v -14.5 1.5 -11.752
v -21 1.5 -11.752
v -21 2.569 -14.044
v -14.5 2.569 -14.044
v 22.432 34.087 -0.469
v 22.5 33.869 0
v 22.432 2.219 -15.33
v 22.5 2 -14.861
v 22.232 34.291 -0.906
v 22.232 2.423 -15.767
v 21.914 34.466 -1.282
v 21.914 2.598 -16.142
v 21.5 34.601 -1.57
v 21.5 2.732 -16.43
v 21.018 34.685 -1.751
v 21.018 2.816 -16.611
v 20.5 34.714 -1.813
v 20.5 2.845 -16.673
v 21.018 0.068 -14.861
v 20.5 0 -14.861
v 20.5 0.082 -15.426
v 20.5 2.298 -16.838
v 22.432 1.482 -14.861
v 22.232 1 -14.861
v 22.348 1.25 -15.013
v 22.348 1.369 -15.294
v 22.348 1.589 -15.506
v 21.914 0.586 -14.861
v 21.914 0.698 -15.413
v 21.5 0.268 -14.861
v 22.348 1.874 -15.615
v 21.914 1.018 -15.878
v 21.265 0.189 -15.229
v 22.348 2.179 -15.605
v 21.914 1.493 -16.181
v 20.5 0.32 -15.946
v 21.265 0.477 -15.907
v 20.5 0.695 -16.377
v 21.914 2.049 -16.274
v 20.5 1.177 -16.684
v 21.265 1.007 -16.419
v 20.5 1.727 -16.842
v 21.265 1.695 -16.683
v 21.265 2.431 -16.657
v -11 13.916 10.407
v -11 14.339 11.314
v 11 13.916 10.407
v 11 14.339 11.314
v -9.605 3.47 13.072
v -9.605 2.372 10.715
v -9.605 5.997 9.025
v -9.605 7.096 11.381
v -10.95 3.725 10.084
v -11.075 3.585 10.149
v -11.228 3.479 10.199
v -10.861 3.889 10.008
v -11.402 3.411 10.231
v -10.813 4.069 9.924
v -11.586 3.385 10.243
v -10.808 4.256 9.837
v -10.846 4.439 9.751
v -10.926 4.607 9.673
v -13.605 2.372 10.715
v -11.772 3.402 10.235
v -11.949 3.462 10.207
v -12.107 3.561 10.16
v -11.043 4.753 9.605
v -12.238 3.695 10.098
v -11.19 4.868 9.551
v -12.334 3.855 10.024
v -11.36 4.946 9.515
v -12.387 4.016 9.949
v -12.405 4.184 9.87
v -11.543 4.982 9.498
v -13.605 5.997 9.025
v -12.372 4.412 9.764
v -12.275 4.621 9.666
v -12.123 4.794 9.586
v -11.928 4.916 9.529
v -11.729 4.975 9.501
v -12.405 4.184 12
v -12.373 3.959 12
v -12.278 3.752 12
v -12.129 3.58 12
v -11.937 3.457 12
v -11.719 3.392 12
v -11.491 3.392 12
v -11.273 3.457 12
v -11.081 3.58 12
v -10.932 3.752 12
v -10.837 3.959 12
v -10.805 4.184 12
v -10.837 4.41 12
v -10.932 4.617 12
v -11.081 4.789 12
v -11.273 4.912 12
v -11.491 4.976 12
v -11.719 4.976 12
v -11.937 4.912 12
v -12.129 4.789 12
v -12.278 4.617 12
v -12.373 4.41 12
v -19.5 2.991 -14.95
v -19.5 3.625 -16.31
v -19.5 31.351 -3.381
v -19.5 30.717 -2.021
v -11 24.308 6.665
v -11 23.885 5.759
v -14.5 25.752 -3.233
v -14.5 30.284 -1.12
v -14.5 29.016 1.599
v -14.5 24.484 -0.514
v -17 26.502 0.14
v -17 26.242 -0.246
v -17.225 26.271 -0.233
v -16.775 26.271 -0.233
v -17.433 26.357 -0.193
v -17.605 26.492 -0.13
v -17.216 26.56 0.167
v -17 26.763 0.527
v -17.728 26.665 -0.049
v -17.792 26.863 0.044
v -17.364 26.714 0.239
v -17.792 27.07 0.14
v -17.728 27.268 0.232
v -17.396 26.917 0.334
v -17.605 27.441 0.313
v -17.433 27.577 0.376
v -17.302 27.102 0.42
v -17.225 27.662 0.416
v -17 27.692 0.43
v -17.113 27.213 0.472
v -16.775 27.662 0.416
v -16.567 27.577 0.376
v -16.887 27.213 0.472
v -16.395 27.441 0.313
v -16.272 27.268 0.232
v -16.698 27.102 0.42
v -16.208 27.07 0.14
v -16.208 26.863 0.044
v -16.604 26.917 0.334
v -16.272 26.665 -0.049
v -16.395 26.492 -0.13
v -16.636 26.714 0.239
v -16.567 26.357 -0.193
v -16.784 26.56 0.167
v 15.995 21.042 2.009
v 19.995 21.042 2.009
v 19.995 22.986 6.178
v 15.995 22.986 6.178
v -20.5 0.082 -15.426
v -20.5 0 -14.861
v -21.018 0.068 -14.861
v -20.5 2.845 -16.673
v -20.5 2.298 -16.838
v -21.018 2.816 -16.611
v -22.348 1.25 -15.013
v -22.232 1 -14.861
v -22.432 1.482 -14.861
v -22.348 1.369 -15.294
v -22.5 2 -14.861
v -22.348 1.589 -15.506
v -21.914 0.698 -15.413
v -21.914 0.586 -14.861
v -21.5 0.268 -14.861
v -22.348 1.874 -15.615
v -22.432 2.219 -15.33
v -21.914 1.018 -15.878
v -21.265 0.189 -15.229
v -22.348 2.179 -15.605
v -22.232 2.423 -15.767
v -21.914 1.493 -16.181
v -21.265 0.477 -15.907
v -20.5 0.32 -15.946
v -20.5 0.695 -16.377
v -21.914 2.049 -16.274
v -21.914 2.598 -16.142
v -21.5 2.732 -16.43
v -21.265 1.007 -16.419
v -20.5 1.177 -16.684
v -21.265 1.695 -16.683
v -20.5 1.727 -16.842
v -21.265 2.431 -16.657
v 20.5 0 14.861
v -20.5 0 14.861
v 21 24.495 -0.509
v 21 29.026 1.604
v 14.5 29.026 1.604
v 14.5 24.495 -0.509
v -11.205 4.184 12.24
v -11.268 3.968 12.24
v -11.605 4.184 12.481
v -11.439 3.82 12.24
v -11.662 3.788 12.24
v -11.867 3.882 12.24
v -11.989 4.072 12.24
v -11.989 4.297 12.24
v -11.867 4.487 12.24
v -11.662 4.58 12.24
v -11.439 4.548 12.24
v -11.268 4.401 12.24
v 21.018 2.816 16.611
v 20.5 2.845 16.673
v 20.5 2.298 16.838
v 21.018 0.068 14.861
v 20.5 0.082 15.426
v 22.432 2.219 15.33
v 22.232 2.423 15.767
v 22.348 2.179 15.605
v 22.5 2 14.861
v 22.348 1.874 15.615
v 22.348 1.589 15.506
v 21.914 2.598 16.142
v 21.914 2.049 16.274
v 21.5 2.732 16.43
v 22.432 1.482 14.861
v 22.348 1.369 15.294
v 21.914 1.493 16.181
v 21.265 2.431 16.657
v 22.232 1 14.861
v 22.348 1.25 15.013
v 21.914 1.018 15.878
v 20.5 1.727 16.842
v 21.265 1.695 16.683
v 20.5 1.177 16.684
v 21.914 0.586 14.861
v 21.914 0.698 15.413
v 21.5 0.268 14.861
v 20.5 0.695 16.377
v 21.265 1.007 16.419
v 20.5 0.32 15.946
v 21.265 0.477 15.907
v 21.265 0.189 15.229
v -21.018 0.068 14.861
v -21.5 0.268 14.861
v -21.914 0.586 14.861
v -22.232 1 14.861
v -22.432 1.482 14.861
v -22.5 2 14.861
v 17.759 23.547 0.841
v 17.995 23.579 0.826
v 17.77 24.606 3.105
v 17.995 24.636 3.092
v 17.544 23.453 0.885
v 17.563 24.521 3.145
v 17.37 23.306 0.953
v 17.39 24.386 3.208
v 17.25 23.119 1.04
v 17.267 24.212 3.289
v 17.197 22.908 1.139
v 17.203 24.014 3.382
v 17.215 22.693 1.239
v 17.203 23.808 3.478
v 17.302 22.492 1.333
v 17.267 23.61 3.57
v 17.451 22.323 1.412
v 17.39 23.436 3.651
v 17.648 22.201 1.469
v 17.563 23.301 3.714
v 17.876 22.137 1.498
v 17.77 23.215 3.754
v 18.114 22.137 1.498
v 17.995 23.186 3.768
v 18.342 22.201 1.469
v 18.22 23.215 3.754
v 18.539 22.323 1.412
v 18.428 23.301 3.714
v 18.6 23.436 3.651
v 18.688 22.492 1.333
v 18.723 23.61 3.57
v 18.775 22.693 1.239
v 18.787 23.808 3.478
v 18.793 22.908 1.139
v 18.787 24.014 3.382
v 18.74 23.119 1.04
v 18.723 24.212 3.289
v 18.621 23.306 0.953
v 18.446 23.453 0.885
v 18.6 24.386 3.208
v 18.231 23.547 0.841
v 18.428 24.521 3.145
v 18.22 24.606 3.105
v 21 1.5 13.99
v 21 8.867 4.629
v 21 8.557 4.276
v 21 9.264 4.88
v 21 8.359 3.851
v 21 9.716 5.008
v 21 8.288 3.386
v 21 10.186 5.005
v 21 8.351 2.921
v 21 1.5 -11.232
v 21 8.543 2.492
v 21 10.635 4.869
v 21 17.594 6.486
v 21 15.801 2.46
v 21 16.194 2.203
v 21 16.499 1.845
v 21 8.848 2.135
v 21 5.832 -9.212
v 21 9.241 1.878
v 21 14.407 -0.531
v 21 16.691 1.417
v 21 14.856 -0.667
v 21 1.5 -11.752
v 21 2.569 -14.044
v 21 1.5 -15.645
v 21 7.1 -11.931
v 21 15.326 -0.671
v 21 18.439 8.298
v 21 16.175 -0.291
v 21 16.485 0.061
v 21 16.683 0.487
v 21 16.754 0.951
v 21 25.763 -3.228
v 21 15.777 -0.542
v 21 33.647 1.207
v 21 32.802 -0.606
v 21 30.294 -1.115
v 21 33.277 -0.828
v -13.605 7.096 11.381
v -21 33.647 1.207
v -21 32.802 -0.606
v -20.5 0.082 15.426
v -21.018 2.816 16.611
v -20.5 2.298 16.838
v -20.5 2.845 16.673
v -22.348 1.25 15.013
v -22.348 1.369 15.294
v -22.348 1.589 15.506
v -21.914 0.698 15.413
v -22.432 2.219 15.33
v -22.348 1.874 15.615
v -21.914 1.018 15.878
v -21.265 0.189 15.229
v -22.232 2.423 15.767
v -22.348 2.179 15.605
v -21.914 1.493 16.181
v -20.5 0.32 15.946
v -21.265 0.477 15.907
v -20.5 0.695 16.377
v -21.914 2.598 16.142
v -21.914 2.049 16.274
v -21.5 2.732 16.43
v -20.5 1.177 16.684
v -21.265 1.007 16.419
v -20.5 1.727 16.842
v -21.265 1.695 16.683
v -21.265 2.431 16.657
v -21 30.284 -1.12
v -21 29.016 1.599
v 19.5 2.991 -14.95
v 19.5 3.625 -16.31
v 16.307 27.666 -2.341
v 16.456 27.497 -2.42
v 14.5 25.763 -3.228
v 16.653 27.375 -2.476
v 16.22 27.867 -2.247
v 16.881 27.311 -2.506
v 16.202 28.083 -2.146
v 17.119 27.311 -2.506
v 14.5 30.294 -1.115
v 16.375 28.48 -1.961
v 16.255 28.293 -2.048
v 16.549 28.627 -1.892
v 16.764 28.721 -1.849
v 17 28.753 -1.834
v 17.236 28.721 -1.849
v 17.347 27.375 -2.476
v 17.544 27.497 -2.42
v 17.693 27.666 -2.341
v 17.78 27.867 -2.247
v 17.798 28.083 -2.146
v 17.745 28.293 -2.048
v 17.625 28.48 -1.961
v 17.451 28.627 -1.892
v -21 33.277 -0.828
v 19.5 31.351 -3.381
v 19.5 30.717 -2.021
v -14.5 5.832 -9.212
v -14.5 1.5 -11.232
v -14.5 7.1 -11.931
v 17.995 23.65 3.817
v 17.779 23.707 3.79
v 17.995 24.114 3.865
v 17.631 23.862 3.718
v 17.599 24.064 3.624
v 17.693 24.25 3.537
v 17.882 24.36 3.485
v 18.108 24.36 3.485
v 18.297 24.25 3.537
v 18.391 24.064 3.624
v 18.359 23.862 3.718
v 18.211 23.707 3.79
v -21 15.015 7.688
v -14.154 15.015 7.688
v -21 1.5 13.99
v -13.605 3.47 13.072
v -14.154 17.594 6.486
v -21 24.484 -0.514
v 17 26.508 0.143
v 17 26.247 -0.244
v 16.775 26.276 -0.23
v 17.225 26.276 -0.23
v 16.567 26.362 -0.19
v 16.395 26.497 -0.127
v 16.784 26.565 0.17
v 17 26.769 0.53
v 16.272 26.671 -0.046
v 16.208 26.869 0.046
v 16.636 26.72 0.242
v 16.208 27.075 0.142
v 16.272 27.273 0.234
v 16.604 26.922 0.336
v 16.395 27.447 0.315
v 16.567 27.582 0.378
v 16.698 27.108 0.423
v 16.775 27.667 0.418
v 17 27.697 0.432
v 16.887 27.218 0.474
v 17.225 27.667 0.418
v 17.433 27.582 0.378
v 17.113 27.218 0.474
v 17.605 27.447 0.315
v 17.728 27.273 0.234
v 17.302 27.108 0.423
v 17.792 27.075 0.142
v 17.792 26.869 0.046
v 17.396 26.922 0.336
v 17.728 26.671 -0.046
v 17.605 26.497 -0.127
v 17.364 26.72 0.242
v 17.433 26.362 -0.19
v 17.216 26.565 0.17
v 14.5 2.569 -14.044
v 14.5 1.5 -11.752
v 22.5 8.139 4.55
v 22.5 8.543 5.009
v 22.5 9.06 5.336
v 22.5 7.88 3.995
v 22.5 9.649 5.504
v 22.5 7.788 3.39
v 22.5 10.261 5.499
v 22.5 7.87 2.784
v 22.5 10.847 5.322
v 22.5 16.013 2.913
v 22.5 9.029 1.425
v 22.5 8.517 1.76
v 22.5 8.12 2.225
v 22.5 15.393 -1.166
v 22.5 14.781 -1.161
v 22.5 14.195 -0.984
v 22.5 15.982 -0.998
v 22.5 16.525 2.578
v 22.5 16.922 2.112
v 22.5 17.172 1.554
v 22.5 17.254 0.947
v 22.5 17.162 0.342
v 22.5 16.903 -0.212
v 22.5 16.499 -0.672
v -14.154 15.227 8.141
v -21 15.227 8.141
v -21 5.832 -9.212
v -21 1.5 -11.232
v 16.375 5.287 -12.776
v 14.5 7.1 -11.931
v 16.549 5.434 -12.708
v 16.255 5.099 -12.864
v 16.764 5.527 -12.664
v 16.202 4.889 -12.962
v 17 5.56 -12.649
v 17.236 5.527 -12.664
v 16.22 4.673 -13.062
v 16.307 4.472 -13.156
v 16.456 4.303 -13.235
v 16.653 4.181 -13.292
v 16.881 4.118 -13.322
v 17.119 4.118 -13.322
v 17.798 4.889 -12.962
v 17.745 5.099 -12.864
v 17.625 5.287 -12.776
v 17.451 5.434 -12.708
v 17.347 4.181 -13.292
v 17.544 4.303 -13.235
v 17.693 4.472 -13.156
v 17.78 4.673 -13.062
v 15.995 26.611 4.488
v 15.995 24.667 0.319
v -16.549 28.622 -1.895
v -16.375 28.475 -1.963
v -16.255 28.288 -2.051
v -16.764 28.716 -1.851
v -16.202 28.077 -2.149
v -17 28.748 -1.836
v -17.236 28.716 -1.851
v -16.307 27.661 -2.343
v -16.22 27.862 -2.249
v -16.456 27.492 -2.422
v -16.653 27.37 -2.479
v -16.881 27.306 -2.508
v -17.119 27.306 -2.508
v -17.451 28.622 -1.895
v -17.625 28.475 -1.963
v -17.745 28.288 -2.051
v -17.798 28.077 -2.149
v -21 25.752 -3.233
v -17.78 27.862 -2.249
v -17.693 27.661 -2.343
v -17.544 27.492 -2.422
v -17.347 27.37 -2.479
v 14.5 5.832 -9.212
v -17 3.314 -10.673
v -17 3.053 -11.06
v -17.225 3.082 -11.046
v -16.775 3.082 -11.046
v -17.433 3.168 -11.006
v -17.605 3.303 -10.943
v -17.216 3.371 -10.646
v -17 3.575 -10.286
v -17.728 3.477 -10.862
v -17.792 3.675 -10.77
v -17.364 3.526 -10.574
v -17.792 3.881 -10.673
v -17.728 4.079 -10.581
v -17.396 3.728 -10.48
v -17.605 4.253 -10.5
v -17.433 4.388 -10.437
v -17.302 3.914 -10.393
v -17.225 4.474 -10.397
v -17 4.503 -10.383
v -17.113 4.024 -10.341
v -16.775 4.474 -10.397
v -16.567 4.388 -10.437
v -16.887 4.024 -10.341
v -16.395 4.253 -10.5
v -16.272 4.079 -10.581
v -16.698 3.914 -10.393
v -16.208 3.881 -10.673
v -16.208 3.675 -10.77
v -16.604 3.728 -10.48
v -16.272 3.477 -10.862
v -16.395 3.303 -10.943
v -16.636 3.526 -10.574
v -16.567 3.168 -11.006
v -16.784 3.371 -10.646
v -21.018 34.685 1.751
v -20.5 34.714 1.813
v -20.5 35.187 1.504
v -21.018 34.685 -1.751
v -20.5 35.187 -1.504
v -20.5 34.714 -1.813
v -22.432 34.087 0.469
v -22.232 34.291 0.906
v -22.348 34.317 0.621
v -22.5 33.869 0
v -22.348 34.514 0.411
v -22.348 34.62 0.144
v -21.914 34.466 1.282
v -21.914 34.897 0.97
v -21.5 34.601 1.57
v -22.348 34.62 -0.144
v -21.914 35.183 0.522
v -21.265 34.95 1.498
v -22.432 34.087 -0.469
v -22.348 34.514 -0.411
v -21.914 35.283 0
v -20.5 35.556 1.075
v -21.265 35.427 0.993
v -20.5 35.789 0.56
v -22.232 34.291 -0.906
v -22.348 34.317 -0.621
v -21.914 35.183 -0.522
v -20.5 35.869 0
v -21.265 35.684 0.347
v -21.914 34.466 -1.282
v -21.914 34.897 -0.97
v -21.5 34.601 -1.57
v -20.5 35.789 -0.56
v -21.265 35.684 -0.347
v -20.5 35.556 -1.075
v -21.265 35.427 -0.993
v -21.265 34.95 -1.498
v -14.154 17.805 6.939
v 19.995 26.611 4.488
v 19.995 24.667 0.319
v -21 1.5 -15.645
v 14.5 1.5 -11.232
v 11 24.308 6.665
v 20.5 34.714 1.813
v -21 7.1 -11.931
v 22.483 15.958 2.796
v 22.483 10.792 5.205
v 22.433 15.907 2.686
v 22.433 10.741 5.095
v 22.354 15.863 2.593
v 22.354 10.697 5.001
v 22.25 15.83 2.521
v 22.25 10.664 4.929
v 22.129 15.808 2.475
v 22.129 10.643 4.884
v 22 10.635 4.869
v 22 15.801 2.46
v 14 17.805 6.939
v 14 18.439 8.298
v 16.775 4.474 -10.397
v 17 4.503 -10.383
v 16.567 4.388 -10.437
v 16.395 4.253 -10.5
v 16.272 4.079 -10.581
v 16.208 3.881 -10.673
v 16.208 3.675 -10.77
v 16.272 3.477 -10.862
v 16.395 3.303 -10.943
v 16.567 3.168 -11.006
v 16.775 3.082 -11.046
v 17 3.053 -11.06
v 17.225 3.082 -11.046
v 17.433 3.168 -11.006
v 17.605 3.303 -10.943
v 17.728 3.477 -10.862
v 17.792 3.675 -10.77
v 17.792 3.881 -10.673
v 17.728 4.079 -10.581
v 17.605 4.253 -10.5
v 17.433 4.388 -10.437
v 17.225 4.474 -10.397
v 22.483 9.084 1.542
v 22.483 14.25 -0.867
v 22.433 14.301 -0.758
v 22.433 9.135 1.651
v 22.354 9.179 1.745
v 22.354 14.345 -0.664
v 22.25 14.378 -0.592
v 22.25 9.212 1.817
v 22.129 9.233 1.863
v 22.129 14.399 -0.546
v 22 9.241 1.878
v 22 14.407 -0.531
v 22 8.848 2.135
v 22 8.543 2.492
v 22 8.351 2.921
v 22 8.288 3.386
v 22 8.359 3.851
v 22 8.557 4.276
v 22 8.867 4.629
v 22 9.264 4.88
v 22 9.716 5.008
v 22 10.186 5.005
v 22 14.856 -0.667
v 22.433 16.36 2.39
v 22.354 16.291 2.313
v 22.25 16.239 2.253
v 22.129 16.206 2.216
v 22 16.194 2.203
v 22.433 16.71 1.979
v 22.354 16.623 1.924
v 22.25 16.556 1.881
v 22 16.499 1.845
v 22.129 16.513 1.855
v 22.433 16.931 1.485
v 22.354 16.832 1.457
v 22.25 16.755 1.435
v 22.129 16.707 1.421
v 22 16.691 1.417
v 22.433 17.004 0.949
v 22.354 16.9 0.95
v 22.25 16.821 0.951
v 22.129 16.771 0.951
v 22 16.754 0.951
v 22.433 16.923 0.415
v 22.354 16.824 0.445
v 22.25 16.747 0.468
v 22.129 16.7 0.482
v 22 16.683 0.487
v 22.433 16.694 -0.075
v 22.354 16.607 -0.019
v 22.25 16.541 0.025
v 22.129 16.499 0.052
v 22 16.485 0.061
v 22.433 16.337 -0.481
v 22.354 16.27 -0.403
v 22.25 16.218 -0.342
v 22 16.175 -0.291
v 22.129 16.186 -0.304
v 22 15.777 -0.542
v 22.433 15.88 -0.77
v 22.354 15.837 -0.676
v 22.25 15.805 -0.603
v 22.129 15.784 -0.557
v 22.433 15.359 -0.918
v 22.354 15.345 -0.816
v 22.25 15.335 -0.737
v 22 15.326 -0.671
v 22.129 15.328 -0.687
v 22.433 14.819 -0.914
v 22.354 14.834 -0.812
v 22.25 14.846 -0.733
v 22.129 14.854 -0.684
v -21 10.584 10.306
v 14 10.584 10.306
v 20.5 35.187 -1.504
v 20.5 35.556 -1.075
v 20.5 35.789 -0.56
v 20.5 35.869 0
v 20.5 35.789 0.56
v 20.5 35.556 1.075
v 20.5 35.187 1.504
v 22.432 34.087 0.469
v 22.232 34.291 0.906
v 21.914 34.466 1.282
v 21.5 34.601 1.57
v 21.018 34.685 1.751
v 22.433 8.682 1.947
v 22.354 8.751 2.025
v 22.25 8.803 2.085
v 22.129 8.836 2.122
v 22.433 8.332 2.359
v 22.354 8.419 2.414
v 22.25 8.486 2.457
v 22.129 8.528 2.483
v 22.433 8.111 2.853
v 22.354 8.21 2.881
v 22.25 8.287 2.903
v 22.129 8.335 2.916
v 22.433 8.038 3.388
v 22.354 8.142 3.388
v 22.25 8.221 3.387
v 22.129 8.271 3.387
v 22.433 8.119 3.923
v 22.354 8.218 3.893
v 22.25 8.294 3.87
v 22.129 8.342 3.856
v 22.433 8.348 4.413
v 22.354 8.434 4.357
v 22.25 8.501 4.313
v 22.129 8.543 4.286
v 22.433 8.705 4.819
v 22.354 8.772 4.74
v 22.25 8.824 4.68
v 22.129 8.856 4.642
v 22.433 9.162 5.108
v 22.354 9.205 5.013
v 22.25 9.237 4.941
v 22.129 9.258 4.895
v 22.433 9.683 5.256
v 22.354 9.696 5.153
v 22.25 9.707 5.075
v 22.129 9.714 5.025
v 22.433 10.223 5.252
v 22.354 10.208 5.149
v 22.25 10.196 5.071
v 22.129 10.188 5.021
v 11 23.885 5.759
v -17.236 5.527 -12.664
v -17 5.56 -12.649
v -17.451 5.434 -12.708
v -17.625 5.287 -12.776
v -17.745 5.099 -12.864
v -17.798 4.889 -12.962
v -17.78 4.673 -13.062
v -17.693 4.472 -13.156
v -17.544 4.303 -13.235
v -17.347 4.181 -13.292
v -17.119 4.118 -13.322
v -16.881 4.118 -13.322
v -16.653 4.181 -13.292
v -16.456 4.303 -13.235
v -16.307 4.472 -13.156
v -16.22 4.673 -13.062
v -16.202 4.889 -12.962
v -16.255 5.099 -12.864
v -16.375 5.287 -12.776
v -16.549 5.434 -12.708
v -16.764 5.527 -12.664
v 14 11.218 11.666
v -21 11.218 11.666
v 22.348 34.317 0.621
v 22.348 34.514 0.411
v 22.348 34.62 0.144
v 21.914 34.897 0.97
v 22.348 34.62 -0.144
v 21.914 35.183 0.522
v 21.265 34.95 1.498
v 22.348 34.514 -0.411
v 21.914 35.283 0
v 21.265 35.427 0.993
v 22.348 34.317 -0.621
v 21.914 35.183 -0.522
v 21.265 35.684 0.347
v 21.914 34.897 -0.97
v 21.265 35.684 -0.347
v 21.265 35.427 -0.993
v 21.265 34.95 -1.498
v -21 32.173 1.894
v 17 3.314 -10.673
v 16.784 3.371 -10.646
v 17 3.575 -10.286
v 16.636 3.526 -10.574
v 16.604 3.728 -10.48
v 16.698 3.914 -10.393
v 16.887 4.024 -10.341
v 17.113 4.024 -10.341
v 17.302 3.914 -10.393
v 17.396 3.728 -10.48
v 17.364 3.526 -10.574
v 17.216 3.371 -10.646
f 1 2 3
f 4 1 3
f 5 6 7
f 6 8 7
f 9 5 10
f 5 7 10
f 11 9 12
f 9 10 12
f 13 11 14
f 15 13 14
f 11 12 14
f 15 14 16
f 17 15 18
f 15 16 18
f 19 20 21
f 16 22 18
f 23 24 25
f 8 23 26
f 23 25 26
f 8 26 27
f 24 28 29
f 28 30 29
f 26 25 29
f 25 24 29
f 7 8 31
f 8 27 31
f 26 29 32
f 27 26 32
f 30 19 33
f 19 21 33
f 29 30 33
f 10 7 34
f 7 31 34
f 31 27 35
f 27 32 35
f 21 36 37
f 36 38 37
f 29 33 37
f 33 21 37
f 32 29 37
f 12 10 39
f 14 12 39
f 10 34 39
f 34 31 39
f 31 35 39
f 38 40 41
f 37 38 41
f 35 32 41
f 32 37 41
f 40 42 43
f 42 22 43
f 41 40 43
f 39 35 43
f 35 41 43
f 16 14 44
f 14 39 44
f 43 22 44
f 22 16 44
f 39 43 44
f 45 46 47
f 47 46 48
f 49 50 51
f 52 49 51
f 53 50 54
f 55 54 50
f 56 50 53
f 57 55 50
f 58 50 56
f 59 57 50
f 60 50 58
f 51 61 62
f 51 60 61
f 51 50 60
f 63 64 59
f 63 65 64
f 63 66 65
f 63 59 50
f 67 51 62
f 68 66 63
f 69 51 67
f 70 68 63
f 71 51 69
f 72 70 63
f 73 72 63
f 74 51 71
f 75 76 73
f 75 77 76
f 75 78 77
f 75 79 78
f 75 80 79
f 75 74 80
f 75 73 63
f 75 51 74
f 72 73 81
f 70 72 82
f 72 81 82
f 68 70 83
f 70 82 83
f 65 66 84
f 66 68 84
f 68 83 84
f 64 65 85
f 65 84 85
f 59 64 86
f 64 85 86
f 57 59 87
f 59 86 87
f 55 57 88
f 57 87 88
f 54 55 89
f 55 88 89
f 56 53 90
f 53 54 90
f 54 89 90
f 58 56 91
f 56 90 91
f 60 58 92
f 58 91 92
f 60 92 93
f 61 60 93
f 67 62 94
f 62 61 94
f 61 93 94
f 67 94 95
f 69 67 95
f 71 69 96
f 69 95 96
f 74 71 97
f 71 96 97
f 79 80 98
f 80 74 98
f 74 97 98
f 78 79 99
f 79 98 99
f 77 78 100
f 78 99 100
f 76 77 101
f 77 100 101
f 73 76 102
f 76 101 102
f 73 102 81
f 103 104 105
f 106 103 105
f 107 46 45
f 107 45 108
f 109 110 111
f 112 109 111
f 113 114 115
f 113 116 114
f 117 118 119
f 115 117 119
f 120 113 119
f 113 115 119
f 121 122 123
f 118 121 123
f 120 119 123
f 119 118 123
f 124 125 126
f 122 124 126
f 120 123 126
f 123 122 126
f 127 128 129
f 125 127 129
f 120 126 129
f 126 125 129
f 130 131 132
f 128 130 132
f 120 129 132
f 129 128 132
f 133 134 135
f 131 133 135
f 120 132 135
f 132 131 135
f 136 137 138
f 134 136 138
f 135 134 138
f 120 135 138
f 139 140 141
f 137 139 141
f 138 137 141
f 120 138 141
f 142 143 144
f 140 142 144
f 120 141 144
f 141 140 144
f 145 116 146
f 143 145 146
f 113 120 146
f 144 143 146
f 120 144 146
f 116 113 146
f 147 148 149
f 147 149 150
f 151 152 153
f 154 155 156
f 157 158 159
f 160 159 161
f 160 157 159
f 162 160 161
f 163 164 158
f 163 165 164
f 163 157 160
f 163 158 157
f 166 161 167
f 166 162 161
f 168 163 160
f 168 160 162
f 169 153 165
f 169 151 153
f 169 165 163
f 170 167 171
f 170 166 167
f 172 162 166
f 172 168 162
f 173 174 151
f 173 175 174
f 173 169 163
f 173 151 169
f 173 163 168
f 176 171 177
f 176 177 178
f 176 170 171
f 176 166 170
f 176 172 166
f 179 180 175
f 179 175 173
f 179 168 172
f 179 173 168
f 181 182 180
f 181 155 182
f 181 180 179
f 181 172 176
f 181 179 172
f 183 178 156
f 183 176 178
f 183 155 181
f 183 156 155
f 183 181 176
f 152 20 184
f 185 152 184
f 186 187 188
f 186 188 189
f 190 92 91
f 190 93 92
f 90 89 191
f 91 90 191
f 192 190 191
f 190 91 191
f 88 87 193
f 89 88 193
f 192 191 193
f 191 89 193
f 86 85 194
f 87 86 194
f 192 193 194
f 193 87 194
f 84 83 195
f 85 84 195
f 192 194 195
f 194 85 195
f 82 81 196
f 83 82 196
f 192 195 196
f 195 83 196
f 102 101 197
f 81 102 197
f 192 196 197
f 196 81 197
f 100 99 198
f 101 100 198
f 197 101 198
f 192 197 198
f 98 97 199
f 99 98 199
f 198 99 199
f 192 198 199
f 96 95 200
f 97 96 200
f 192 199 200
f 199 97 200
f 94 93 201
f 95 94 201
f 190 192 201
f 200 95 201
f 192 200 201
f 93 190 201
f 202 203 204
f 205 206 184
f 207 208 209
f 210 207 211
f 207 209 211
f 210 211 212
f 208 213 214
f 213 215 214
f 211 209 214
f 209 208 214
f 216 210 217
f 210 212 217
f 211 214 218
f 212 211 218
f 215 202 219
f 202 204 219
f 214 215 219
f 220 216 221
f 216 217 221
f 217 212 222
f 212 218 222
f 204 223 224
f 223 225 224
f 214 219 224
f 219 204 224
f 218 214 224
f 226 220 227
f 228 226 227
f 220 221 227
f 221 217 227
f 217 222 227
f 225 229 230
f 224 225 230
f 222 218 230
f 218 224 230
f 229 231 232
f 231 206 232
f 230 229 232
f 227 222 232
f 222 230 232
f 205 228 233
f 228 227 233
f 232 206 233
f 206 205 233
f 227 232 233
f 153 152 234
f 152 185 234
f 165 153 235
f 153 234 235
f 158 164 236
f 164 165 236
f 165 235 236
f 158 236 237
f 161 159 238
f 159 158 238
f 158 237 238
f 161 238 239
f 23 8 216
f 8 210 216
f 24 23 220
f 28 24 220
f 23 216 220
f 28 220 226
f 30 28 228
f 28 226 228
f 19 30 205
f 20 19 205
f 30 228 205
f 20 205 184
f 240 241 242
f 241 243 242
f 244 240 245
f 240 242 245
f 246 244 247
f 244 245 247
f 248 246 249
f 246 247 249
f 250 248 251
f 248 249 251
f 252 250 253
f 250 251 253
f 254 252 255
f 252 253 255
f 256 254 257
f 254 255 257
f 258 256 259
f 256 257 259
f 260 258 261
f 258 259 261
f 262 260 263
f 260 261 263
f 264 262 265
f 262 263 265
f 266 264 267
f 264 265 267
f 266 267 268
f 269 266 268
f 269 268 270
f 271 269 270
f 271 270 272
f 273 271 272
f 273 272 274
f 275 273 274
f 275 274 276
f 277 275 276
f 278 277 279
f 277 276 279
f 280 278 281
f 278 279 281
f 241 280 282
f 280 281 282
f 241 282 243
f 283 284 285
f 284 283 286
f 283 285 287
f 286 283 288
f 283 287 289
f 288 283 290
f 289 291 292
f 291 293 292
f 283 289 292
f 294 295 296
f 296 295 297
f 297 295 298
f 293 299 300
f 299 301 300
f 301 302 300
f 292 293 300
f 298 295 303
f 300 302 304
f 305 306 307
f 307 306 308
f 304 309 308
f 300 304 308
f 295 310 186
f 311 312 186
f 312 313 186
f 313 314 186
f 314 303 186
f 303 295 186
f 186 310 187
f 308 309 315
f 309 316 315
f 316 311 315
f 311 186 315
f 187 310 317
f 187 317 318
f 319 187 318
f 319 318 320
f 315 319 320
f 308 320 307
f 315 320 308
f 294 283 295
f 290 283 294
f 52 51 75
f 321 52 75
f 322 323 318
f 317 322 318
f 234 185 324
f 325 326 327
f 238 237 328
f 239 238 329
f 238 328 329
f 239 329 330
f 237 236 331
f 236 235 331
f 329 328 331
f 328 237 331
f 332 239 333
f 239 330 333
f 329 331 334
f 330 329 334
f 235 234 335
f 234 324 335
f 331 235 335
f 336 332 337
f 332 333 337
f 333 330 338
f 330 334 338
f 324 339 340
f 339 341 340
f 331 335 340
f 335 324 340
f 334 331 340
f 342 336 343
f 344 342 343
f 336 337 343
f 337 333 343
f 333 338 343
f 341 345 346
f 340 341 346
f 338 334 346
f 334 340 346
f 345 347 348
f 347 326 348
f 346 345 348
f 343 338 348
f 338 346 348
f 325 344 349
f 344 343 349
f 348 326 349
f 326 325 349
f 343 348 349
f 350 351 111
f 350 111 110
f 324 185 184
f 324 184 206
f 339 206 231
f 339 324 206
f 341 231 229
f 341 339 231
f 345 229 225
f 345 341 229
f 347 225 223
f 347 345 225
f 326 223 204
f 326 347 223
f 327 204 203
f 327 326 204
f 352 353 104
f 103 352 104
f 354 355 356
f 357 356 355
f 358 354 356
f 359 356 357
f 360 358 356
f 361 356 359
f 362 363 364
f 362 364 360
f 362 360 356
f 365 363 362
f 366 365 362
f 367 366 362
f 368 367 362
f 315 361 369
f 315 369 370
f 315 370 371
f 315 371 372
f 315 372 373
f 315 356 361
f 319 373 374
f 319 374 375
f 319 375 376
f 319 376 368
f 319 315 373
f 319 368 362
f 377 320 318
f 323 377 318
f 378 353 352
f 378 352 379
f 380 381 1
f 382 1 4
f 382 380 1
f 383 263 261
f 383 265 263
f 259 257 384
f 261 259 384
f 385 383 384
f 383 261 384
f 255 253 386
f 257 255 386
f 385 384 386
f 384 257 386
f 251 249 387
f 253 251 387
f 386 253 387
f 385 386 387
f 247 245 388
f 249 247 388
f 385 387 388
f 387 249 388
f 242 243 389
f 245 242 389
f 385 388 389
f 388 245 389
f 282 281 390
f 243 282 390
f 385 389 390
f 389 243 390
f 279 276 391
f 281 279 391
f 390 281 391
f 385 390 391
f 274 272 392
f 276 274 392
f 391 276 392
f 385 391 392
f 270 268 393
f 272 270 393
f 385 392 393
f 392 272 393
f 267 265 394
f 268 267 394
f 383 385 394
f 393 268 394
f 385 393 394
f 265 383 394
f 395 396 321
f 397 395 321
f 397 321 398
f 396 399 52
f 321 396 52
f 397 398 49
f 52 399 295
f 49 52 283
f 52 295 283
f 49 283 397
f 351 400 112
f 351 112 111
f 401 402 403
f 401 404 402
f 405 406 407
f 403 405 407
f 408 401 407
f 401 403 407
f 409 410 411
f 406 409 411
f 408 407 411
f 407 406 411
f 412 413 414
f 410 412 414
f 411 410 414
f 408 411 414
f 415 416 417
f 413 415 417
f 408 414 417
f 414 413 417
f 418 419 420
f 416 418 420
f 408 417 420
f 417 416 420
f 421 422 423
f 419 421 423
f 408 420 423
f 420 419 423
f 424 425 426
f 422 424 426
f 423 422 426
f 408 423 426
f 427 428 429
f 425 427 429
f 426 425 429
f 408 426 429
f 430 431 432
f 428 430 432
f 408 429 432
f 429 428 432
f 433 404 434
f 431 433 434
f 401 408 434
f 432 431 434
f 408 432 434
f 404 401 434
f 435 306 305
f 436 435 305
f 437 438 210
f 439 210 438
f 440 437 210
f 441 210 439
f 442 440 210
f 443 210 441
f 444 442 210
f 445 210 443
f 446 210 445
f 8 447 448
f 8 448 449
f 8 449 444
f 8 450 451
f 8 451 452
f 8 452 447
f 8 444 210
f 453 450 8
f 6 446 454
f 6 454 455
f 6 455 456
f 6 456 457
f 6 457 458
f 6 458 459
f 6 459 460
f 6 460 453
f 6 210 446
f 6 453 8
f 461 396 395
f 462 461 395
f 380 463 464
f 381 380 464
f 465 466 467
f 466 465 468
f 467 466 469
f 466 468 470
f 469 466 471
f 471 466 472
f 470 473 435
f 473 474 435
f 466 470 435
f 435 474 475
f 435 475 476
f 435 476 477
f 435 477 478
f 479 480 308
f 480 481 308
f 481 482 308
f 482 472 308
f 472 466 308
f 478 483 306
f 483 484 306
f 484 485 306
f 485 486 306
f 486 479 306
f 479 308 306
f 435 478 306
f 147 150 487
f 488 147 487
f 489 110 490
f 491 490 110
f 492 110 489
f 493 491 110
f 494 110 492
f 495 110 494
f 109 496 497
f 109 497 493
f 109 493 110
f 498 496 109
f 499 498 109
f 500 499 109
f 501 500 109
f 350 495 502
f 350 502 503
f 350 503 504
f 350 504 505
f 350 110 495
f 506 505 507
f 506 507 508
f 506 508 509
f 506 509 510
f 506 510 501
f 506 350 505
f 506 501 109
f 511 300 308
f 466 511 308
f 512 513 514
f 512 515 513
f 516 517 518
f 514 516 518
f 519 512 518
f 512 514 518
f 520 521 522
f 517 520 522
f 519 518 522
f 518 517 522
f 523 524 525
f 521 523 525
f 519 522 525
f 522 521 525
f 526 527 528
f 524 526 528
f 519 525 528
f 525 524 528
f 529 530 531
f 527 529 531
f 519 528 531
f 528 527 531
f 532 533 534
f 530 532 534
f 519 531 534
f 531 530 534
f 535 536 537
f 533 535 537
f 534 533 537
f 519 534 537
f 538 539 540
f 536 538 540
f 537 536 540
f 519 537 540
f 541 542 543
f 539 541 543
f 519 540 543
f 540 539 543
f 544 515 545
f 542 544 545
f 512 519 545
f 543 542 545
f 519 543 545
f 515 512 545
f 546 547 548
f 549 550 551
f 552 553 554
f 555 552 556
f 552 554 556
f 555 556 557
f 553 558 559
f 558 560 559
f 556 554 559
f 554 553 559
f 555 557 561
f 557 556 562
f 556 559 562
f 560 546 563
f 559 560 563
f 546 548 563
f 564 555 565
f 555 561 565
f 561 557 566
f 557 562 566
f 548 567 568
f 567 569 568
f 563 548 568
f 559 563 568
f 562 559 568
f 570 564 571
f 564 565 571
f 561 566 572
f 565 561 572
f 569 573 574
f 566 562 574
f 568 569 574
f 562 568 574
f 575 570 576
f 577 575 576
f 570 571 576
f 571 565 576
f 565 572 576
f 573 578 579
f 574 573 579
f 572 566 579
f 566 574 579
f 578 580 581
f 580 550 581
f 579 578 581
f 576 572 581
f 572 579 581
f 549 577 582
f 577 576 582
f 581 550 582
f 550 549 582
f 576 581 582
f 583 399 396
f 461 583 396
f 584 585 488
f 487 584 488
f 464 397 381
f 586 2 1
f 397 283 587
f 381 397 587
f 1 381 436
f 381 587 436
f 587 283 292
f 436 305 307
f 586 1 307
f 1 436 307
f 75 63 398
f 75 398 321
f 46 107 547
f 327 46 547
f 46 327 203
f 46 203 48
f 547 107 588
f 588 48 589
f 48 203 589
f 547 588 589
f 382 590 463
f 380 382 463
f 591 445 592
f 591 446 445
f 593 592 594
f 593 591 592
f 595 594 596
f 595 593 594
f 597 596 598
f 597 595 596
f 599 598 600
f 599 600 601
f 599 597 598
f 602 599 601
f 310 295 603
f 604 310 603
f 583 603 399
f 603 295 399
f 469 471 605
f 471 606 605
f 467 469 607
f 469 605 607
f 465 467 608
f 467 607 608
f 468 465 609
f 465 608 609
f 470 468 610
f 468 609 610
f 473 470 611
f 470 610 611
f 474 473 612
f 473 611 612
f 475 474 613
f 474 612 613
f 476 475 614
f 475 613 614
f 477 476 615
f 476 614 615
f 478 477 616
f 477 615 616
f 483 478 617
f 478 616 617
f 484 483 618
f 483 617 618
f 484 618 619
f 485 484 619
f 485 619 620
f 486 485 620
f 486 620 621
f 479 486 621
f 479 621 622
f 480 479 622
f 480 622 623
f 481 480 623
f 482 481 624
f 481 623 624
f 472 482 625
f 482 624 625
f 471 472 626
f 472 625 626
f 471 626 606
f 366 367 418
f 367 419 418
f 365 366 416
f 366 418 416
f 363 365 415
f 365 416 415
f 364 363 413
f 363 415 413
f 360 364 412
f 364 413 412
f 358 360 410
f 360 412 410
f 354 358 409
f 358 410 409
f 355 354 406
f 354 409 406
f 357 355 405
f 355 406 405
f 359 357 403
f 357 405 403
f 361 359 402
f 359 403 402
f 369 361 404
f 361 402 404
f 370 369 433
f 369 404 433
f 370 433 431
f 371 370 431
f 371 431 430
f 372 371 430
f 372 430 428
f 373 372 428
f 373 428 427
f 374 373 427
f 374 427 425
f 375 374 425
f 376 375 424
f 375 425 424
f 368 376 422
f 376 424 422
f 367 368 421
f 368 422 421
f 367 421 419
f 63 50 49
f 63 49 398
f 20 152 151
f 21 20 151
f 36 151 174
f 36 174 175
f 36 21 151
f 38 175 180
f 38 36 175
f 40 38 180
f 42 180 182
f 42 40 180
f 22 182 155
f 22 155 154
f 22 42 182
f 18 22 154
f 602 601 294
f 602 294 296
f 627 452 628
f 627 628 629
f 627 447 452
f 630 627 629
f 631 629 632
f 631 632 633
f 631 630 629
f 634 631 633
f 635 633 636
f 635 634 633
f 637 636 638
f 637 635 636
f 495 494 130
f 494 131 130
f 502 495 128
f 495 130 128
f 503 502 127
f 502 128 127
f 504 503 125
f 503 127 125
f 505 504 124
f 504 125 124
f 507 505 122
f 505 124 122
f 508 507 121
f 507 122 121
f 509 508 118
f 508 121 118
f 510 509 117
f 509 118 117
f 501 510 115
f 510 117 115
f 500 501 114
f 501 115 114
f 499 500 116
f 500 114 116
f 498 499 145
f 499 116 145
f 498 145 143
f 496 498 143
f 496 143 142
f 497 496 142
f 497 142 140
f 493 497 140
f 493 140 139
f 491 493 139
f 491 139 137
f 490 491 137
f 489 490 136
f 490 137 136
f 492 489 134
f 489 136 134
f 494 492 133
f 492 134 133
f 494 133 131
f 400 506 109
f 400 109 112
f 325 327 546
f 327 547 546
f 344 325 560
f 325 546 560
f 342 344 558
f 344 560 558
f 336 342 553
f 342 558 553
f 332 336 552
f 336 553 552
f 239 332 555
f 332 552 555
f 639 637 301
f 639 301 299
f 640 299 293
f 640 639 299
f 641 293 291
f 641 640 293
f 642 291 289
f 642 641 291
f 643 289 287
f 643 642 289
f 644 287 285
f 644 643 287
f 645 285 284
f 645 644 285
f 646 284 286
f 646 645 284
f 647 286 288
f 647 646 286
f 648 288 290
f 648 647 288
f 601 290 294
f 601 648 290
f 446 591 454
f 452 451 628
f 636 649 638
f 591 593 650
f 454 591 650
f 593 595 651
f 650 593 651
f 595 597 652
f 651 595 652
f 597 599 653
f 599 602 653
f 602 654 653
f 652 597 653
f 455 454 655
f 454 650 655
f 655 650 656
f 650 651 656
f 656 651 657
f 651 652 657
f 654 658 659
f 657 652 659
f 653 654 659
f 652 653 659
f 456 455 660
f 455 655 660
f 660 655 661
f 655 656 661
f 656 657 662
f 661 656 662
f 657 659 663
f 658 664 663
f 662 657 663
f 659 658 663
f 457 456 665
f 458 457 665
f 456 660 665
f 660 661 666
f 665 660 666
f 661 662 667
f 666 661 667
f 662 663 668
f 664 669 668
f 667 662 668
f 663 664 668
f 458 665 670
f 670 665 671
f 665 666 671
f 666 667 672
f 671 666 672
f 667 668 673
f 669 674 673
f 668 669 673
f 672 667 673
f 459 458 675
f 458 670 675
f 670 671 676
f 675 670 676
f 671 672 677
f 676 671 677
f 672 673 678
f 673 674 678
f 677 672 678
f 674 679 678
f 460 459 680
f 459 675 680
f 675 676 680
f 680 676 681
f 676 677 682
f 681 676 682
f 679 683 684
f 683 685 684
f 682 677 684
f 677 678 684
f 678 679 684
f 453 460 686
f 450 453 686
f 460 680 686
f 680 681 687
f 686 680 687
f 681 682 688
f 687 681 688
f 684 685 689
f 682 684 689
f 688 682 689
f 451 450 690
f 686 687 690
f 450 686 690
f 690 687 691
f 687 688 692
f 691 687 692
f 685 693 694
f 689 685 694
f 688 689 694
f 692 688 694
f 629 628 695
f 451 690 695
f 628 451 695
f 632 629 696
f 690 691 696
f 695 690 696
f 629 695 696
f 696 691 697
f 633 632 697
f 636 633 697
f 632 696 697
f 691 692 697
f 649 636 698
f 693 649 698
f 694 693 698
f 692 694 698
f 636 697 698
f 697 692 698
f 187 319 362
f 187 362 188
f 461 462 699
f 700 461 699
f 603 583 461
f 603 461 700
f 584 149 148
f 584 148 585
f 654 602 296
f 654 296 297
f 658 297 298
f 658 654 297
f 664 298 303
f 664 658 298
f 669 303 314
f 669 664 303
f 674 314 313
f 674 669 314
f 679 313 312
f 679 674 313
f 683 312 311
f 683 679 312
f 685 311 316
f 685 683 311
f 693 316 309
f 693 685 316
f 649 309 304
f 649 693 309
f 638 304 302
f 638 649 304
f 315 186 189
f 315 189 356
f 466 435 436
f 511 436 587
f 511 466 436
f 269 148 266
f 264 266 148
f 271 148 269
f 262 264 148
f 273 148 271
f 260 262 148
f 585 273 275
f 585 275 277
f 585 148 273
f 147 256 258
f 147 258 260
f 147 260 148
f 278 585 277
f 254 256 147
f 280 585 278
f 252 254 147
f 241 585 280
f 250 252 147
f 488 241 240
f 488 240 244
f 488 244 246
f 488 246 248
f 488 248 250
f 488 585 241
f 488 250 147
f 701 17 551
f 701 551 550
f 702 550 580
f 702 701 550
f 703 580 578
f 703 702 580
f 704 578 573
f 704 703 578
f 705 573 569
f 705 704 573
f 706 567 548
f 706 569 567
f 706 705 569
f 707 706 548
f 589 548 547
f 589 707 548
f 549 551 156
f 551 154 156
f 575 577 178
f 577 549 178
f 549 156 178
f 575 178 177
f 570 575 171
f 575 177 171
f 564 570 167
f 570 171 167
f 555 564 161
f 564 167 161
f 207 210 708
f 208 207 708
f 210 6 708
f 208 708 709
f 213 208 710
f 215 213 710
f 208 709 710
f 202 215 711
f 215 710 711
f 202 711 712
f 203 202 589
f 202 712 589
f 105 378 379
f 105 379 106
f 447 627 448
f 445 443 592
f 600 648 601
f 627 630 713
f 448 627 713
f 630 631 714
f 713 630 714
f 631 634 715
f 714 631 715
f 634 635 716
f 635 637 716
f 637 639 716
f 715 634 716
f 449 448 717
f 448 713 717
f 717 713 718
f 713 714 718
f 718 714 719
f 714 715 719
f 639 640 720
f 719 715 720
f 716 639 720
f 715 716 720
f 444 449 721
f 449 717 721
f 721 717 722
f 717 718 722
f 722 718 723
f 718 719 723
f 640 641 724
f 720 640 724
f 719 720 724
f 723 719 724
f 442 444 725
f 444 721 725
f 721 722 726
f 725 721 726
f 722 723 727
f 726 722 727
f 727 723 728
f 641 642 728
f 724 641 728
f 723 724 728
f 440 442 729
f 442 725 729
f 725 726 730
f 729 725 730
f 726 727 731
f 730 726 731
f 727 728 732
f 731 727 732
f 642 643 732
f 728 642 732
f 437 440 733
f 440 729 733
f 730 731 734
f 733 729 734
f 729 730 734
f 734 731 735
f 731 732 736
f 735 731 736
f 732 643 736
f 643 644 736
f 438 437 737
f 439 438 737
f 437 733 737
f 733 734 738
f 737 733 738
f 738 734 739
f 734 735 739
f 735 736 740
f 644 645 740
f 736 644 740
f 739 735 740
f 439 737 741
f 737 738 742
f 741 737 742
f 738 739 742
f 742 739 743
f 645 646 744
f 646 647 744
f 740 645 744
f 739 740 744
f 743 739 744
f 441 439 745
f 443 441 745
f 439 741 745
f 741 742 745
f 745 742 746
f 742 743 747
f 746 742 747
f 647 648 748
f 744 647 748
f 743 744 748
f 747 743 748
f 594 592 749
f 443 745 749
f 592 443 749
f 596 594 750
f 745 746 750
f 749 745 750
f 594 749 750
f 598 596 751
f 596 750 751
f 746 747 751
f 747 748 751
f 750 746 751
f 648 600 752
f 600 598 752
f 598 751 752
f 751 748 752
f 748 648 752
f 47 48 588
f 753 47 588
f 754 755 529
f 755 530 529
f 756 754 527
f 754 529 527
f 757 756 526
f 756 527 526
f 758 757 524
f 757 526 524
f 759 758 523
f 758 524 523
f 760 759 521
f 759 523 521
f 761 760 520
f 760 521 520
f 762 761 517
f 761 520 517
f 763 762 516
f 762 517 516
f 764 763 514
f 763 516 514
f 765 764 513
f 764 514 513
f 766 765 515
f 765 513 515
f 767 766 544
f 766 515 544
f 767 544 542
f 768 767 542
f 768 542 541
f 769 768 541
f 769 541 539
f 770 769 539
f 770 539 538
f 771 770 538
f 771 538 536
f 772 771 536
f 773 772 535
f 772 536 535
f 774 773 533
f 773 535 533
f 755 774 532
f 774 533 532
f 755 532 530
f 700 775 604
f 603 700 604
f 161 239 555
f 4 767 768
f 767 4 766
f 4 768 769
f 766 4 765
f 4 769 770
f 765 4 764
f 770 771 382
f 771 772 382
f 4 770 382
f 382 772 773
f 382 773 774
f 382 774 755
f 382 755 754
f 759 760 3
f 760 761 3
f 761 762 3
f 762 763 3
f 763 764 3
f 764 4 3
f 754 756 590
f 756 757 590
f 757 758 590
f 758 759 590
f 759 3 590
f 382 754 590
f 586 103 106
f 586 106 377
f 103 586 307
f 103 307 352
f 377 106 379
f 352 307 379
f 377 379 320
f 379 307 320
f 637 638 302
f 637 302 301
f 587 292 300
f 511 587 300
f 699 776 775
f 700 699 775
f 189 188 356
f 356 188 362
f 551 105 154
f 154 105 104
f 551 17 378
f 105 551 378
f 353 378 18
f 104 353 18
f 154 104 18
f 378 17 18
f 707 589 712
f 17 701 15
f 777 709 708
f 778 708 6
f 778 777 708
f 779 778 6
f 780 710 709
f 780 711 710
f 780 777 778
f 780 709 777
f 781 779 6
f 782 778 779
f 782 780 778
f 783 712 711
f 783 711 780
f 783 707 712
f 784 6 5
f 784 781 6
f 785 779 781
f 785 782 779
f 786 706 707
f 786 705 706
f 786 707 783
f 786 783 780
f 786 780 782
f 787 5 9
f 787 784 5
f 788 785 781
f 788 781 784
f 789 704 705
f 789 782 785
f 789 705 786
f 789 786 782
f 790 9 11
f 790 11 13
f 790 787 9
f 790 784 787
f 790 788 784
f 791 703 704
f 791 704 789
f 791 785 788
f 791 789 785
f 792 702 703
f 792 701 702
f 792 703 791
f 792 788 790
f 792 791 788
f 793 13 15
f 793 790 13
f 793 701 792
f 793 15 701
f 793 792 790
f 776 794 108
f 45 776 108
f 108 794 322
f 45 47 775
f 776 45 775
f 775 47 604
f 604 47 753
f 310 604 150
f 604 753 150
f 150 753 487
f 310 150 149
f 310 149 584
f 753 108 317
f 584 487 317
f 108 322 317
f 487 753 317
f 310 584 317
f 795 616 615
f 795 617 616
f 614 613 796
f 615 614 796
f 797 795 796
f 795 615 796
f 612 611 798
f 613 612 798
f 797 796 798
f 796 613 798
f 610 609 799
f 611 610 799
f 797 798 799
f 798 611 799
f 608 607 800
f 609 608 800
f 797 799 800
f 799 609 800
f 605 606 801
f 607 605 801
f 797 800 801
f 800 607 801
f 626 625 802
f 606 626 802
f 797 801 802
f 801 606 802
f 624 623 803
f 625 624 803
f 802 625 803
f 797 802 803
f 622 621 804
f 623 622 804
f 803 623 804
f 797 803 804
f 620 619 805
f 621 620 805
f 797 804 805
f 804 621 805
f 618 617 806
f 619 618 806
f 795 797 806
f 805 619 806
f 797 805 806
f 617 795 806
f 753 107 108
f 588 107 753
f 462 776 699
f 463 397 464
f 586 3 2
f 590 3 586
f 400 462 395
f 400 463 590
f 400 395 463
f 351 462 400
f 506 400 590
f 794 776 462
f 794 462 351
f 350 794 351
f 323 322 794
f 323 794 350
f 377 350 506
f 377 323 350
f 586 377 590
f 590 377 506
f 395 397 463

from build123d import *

# Parameters (mm, degrees)
EXTRUDE_1_DEPTH                  = 22.5
SKETCH_2_W                       = 22
SKETCH_2_H                       = 11
CUT_EXTRUDE_1_DEPTH              = 1
CUT_EXTRUDE_2_DEPTH              = 1.5
CUT_EXTRUDE_3_DEPTH              = 21
SKETCH_5_W                       = 39
SKETCH_5_H                       = 30.591628496
CUT_EXTRUDE_4_DEPTH              = 1.5
CUT_EXTRUDE_5_DEPTH              = 2
SKETCH_9_W                       = 4
SKETCH_9_H                       = 4
EXTRUDE_2_DEPTH                  = 5
CUT_EXTRUDE_6_DEPTH              = 5
EXTRUDE_3_DEPTH                  = 8
EXTRUDE_4_DEPTH                  = 8
HOLE_WIZARD_M2_3_D               = 1.6
HOLE_WIZARD_M2_3_DEPTH           = 2.5
HOLE_WIZARD_M2_3_TIP             = 0.480688495
HOLE_WIZARD_M2_3_ON_FACE_2_D     = 1.6
HOLE_WIZARD_M2_3_ON_FACE_2_DEPTH = 2.5
HOLE_WIZARD_M2_3_ON_FACE_2_TIP   = 0.480688495
HOLE_WIZARD_M2_5_D               = 1.6
HOLE_WIZARD_M2_5_DEPTH           = 2.5
HOLE_WIZARD_M2_5_TIP             = 0.480688495
EXTRUDE_6_DEPTH                  = 8
EXTRUDE_7_DEPTH                  = 8
HOLE_WIZARD_M2_7_D               = 1.6
HOLE_WIZARD_M2_7_DEPTH           = 2.5
HOLE_WIZARD_M2_7_TIP             = 0.480688495
HOLE_WIZARD_M2_7_ON_FACE_2_D     = 1.6
HOLE_WIZARD_M2_7_ON_FACE_2_DEPTH = 2.5
HOLE_WIZARD_M2_7_ON_FACE_2_TIP   = 0.480688495
HOLE_WIZARD_M2_11_D              = 1.6
HOLE_WIZARD_M2_11_DEPTH          = 3
HOLE_WIZARD_M2_11_TIP            = 0.480688495
FILLET_2_R                       = 2
FILLET_3_R                       = 0.5


with BuildPart() as part:
    # 草图1 → 凸台-拉伸1 (new body, symmetric)
    with BuildSketch(Plane(origin=(0, 0, 0), x_dir=(0, 0, -1), z_dir=(1, 0, 0))):
        Polygon((18, 0), (-18, 0), (0, 38.601124569), align=None)
    extrude(amount=EXTRUDE_1_DEPTH, both=True)

    # 草图2 → 切除-拉伸1 (cut)
    with BuildSketch(Plane(origin=(0, 6.894399988, 14.785088487), x_dir=(1, 0, 0), z_dir=(0, 0.422618262, 0.906307787))):
        with Locations((0, 13.713818509)):
            Rectangle(SKETCH_2_W, SKETCH_2_H)
    extrude(amount=-CUT_EXTRUDE_1_DEPTH, mode=Mode.SUBTRACT)

    # 草图3 → 切除-拉伸2 (cut)
    with BuildSketch(Plane(origin=(0, 6.471781726, 13.8787807), x_dir=(1, 0, 0), z_dir=(0, 0.422618262, 0.906307787))):
        Polygon((0, 5.236711419), (14, 5.236711419), (14, 13.686711419), (14, 28.358445695), (-21, 28.358445695), (-21, 5.236711419), align=None)
    extrude(amount=-CUT_EXTRUDE_2_DEPTH, mode=Mode.SUBTRACT)

    # 草图4 → 切除-拉伸3 (cut, symmetric)
    with BuildSketch(Plane(origin=(0, 0, 0), x_dir=(0, 0, -1), z_dir=(1, 0, 0))):
        Polygon((0.827533439, 33.277171007), (-13.990404756, 1.5), (15.645471634, 1.5), align=None)
    extrude(amount=CUT_EXTRUDE_3_DEPTH, both=True, mode=Mode.SUBTRACT)

    # 草图5 → 切除-拉伸4 (cut)
    with BuildSketch(Plane(origin=(0, 6.894399988, -14.785088487), x_dir=(-1, 0, 0), z_dir=(0, 0.422618262, -0.906307787))):
        with Locations((0, 11.688685537)):
            Rectangle(SKETCH_5_W, SKETCH_5_H)
    extrude(amount=-CUT_EXTRUDE_4_DEPTH, mode=Mode.SUBTRACT)

    # 草图6 → 切除-拉伸5 (cut)
    with BuildSketch(Plane(origin=(0, 5.626545203, 12.066165126), x_dir=(-1, 0, 0), z_dir=(0, -0.422618262, -0.906307787))):
        Polygon((-21, 13.204797954), (14.153696271, 13.204797954), (14.153696271, 10.359263572), (21, 10.359263572), (21, 29.984499785), (-21, 29.984499785), align=None)
    extrude(amount=-CUT_EXTRUDE_5_DEPTH, mode=Mode.SUBTRACT)

    # 草图9 → 凸台-拉伸2 (add)
    with BuildSketch(Plane(origin=(0, 4.527737722, 9.70976488), x_dir=(-1, 0, 0), z_dir=(0, -0.422618262, -0.906307787))):
        with Locations((-17.995066385, 20.221063534)):
            Rectangle(SKETCH_9_W, SKETCH_9_H)
        with Locations((11.604933615, -0.378936466)):
            Rectangle(SKETCH_9_W, SKETCH_9_H)
    extrude(amount=-EXTRUDE_2_DEPTH)

    # 草图12 → 切除-拉伸6 (cut)
    with BuildSketch(Plane(origin=(22.5, 0, 0), x_dir=(0, 0, -1), z_dir=(1, 0, 0))):
        with BuildLine():
            Line((-4.868770405, 10.635313289), (-2.459846313, 15.801267675))
            ThreePointArc((-2.459846313, 15.801267675), (-0.267118332, 16.599355392), (0.530969385, 14.406627411))
            Line((0.530969385, 14.406627411), (-1.877954707, 9.240673025))
            ThreePointArc((-1.877954707, 9.240673025), (-4.070682688, 8.442585308), (-4.868770405, 10.635313289))
        make_face()
    extrude(amount=-CUT_EXTRUDE_6_DEPTH, mode=Mode.SUBTRACT)

    # 草图14 → 凸台-拉伸3 (add)
    with BuildSketch(Plane.ZY.offset(22.5)):
        Polygon((-1.120034816, 30.283698198), (-3.233126124, 25.752159263), (-0.514202763, 24.484304477), (1.598888545, 29.015843413), align=None)
    extrude(amount=-EXTRUDE_3_DEPTH)

    # 草图15 → 凸台-拉伸4 (add)
    with BuildSketch(Plane(origin=(22.5, 0, 0), x_dir=(0, 0, -1), z_dir=(1, 0, 0))):
        Polygon((14.043757485, 2.568685494), (11.324834124, 1.300830709), (9.211742816, 5.832369644), (11.930666177, 7.100224429), align=None)
    extrude(amount=-EXTRUDE_4_DEPTH)

    # M2 螺纹孔3
    with Locations(Plane(origin=(17, 4.834454961, -12.987211831), x_dir=(0, -0.906307787, -0.422618262), z_dir=(0, 0.422618262, -0.906307787))):
        with Locations((0, 0)):
            Hole(HOLE_WIZARD_M2_3_D / 2, depth=HOLE_WIZARD_M2_3_DEPTH)
            with Locations((0, 0, -(HOLE_WIZARD_M2_3_DEPTH + HOLE_WIZARD_M2_3_TIP / 2))):  # 118° drill point
                Cone(0, HOLE_WIZARD_M2_3_D / 2, HOLE_WIZARD_M2_3_TIP, mode=Mode.SUBTRACT)

    # M2 螺纹孔3 on face 2
    with Locations(Plane(origin=(-17, 28.023137941, -2.174151375), x_dir=(0, -0.906307925, -0.422617965), z_dir=(0, 0.422617965, -0.906307925))):
        with Locations((1e-09, 0)):
            Hole(HOLE_WIZARD_M2_3_ON_FACE_2_D / 2, depth=HOLE_WIZARD_M2_3_ON_FACE_2_DEPTH)
            with Locations((0, 0, -(HOLE_WIZARD_M2_3_ON_FACE_2_DEPTH + HOLE_WIZARD_M2_3_ON_FACE_2_TIP / 2))):  # 118° drill point
                Cone(0, HOLE_WIZARD_M2_3_ON_FACE_2_D / 2, HOLE_WIZARD_M2_3_ON_FACE_2_TIP, mode=Mode.SUBTRACT)

    # M2 螺纹孔5
    with Locations(Plane(origin=(17.995066385, 22.854245065, 1.163974158), x_dir=(0, -0.906307787, 0.422618262), z_dir=(0, -0.422618262, -0.906307787))):
        with Locations((0, 0)):
            Hole(HOLE_WIZARD_M2_5_D / 2, depth=HOLE_WIZARD_M2_5_DEPTH)
            with Locations((0, 0, -(HOLE_WIZARD_M2_5_DEPTH + HOLE_WIZARD_M2_5_TIP / 2))):  # 118° drill point
                Cone(0, HOLE_WIZARD_M2_5_D / 2, HOLE_WIZARD_M2_5_TIP, mode=Mode.SUBTRACT)

    # 草图27 → 凸台-拉伸6 (add)
    with BuildSketch(Plane.ZY.offset(22.5)):
        Polygon((-14.043757485, 2.568685494), (-11.930666177, 7.100224429), (-9.211742816, 5.832369644), (-11.324834124, 1.300830709), align=None)
    extrude(amount=-EXTRUDE_6_DEPTH)

    # 草图28 → 凸台-拉伸7 (add)
    with BuildSketch(Plane(origin=(22.5, 0, 0), x_dir=(0, 0, -1), z_dir=(1, 0, 0))):
        Polygon((1.115176626, 30.294116619), (-1.603746735, 29.026261833), (0.509344574, 24.494722898), (3.228267935, 25.762577683), align=None)
    extrude(amount=-EXTRUDE_7_DEPTH)

    # M2 螺纹孔7
    with Locations(Plane(origin=(17, 28.028347151, -2.171722281), x_dir=(0, -0.906307787, -0.422618262), z_dir=(0, 0.422618262, -0.906307787))):
        with Locations((0, 0)):
            Hole(HOLE_WIZARD_M2_7_D / 2, depth=HOLE_WIZARD_M2_7_DEPTH)
            with Locations((0, 0, -(HOLE_WIZARD_M2_7_DEPTH + HOLE_WIZARD_M2_7_TIP / 2))):  # 118° drill point
                Cone(0, HOLE_WIZARD_M2_7_D / 2, HOLE_WIZARD_M2_7_TIP, mode=Mode.SUBTRACT)

    # M2 螺纹孔7 on face 2
    with Locations(Plane(origin=(-17, 4.834454961, -12.987211831), x_dir=(0, -0.906307925, -0.422617965), z_dir=(0, 0.422617965, -0.906307925))):
        with Locations((0, 0)):
            Hole(HOLE_WIZARD_M2_7_ON_FACE_2_D / 2, depth=HOLE_WIZARD_M2_7_ON_FACE_2_DEPTH)
            with Locations((0, 0, -(HOLE_WIZARD_M2_7_ON_FACE_2_DEPTH + HOLE_WIZARD_M2_7_ON_FACE_2_TIP / 2))):  # 118° drill point
                Cone(0, HOLE_WIZARD_M2_7_ON_FACE_2_D / 2, HOLE_WIZARD_M2_7_ON_FACE_2_TIP, mode=Mode.SUBTRACT)

    # M2 螺纹孔11
    with Locations(Plane(origin=(0, 0, 9), x_dir=(1, 0, 0), z_dir=(0, 0, -1))):
        with Locations((-11.604933615, -4.184304653)):
            Hole(HOLE_WIZARD_M2_11_D / 2, depth=HOLE_WIZARD_M2_11_DEPTH)
            with Locations((0, 0, -(HOLE_WIZARD_M2_11_DEPTH + HOLE_WIZARD_M2_11_TIP / 2))):  # 118° drill point
                Cone(0, HOLE_WIZARD_M2_11_D / 2, HOLE_WIZARD_M2_11_TIP, mode=Mode.SUBTRACT)

    # 圆角2
    fillet_2_edges = [part.edges().sort_by_distance(p)[0] for p in [
        (22.5, 0, 0),
        (-22.5, 0, 0),
        (22.5, 19.300562285, -9),
        (-22.5, 19.300562285, 9),
        (-22.5, 19.300562285, -9),
        (0, 0, -18),
        (0, 0, 18),
        (0, 38.601124569, 0),
        (22.5, 19.300562285, 9),
    ]]
    fillet(fillet_2_edges, radius=FILLET_2_R)

    # 圆角3
    fillet_3_edges = [part.edges().sort_by_distance(p)[0] for p in [
        (22.5, 8.442585308, 4.070682688),
        (22.5, 11.823650218, 0.673492661),
        (22.5, 16.599355392, 0.267118332),
        (22.5, 13.218290482, 3.664308359),
    ]]
    fillet(fillet_3_edges, radius=FILLET_3_R)


solid = part.part
